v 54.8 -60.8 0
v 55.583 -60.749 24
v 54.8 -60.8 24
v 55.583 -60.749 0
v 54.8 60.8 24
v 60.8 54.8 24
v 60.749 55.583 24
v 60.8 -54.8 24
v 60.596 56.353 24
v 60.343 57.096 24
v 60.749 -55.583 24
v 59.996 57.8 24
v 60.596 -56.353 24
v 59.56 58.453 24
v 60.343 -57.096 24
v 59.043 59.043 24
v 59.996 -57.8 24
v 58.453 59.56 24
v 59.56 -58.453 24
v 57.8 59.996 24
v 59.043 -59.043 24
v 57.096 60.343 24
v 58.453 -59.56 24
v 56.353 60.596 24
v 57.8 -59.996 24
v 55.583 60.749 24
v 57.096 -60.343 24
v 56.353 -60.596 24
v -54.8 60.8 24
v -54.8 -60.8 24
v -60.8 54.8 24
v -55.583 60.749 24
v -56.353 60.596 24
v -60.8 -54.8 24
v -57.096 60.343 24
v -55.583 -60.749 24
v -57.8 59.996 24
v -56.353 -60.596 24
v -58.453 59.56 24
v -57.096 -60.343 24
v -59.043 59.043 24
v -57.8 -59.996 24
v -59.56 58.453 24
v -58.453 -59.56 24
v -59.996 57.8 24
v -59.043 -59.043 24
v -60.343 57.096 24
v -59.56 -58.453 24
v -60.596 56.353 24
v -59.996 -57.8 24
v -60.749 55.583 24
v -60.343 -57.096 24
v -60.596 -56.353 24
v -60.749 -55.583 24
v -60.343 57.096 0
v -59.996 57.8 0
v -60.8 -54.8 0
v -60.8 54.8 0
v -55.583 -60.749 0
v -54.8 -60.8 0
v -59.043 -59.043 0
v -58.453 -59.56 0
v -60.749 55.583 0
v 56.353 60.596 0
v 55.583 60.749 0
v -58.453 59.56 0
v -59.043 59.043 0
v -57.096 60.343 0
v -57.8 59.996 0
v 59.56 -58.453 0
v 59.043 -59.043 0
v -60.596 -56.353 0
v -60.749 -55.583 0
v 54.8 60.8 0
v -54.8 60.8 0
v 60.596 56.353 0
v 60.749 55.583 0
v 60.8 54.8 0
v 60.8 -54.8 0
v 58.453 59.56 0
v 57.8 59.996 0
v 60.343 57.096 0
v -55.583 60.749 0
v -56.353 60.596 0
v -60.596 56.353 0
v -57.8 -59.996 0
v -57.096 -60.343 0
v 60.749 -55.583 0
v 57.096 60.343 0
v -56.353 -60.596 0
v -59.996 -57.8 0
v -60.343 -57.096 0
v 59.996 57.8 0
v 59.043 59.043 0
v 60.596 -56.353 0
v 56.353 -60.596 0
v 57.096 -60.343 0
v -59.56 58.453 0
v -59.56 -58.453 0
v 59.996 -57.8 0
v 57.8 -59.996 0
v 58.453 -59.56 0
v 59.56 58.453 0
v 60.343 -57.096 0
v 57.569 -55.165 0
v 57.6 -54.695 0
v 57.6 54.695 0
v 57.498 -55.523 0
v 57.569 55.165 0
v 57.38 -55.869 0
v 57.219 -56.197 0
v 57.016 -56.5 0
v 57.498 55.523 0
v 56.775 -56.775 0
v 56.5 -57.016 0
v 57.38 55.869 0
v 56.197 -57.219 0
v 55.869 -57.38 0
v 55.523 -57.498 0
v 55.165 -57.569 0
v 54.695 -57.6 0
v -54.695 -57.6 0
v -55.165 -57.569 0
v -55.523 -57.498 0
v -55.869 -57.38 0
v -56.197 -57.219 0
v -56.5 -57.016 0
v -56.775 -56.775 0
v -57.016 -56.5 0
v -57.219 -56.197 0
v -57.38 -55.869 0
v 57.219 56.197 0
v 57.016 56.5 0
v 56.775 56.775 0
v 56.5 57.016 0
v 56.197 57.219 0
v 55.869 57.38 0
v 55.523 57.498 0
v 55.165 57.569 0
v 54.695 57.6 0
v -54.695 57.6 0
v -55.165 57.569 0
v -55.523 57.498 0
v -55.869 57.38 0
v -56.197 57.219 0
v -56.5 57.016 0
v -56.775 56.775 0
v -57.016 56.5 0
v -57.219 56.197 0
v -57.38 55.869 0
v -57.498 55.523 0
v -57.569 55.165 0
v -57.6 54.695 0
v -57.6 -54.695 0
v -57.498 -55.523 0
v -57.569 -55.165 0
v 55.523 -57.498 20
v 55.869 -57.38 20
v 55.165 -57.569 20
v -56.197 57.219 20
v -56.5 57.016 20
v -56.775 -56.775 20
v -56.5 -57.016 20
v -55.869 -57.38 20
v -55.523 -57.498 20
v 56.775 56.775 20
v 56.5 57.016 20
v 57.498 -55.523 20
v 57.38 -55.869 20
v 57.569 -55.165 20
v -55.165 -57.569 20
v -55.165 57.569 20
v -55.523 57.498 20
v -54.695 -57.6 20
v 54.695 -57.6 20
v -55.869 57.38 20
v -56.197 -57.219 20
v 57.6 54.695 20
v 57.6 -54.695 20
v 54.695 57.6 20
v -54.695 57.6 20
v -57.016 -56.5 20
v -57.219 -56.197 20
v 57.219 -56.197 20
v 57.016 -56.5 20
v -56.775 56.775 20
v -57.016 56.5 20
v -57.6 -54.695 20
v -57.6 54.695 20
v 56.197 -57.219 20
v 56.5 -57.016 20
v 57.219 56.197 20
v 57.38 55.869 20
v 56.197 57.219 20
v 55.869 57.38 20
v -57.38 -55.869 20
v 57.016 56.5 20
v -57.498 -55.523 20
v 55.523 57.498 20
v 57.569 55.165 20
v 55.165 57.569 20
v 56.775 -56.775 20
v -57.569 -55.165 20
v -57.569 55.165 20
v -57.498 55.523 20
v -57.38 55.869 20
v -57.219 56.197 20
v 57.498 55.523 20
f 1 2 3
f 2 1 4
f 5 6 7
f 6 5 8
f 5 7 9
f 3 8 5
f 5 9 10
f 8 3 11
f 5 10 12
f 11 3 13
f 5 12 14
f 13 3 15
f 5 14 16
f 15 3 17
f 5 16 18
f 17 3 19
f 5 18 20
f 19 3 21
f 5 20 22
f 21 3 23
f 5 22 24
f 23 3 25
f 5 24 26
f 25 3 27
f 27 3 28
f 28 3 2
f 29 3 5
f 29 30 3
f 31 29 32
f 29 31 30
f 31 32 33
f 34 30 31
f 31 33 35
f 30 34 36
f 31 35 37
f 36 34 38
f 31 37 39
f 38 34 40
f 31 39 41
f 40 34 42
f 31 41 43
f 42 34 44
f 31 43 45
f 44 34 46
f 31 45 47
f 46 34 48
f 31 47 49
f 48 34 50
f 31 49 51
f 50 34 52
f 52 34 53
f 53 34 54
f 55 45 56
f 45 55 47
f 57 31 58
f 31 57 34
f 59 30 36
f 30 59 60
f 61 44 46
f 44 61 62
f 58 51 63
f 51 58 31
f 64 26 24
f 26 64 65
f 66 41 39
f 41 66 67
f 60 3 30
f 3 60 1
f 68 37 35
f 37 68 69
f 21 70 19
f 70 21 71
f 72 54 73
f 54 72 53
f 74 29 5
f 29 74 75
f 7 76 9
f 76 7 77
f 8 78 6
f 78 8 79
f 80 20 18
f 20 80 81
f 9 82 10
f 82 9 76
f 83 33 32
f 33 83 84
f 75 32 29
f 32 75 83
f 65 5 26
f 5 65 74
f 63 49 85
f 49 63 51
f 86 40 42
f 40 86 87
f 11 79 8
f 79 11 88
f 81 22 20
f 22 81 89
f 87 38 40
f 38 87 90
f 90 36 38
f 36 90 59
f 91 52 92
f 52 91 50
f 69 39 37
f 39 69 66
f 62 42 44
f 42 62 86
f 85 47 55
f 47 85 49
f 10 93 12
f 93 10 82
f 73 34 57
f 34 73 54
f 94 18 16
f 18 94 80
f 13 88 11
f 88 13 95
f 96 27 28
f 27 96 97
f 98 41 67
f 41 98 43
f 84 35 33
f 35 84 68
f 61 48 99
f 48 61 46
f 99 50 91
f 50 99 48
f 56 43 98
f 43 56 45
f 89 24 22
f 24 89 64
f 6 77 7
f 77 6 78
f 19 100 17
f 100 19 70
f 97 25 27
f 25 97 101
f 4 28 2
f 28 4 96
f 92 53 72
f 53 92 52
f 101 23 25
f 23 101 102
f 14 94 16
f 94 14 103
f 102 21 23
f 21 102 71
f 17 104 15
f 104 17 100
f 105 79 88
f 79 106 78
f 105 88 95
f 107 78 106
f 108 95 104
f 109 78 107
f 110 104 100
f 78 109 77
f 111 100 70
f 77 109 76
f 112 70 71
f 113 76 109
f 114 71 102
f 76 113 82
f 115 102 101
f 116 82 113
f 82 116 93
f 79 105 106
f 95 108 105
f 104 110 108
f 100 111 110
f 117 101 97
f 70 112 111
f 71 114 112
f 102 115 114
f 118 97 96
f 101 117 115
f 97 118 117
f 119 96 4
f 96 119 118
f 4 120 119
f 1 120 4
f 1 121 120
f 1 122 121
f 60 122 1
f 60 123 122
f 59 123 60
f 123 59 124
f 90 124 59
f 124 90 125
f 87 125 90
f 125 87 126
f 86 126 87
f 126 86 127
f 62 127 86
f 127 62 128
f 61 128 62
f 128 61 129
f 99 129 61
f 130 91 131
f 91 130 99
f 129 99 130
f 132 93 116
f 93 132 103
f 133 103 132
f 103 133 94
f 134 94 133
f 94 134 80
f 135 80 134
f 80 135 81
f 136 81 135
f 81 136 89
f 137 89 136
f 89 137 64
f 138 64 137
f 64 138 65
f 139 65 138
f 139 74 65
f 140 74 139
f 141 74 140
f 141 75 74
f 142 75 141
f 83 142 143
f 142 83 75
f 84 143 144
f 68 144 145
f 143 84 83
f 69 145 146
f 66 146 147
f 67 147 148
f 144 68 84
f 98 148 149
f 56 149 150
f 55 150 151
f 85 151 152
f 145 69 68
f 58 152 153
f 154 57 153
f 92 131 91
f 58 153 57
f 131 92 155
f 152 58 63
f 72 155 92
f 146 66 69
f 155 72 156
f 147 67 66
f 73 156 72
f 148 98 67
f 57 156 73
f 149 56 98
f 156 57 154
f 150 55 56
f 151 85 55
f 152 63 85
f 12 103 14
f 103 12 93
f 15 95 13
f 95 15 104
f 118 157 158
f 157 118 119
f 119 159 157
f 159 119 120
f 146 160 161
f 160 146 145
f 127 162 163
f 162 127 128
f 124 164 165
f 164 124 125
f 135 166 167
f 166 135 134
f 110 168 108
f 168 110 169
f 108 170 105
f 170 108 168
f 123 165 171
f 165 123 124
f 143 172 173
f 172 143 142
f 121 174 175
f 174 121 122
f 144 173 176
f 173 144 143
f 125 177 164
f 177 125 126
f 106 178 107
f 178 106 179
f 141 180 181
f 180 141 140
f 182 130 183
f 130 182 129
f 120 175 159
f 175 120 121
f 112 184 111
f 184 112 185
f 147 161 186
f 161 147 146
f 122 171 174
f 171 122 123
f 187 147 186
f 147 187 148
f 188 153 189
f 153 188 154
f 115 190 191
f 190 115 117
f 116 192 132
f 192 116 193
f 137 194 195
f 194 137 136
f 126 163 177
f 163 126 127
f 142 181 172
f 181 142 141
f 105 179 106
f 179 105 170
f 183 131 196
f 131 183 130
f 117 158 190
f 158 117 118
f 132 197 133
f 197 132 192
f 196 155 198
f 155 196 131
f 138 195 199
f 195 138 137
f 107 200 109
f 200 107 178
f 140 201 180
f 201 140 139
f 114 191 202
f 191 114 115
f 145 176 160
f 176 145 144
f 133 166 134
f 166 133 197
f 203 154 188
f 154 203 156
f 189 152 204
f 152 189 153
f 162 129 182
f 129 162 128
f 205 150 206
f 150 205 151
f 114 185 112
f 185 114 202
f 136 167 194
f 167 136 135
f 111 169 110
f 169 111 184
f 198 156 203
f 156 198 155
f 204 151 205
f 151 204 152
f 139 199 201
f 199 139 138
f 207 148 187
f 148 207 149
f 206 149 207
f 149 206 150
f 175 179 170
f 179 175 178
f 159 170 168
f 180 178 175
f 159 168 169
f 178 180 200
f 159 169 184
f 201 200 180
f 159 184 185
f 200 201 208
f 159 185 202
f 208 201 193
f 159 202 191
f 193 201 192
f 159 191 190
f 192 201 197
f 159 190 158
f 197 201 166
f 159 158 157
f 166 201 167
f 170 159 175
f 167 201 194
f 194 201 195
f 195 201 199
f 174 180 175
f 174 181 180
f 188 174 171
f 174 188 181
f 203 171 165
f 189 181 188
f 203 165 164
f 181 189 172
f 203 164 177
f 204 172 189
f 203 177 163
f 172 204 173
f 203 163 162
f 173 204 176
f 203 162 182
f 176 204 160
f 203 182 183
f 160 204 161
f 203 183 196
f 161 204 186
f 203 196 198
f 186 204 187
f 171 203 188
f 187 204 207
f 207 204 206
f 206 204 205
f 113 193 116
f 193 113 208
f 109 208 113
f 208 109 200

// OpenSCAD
// Parametric printable part scaffold — units: mm
// Copy to project src/, rename modules, fill geometry.

/* [Target object] */
object_x = 100;
object_y = 100;
object_z = 20;       // reference only unless used

/* [Fit / structure] */
fit_clearance = 0.8;
wall = 3.2;
deck_thick = 4.0;
clearance_z = 20;    // open height under deck if elevated

/* [Feet] */
foot_recess_d = 12.4;
foot_recess_h = 1.2;
foot_inset = 12;

/* [Quality] */
$fn = 48;
eps = 0.02;

// Derived
pocket_x = object_x + 2 * fit_clearance;
pocket_y = object_y + 2 * fit_clearance;
outer_x = pocket_x + 2 * 10;
outer_y = pocket_y + 2 * 10;

module outer_footprint() {
  offset(r = 6)
    square([outer_x - 12, outer_y - 12], center = true);
}

module part() {
  difference() {
    union() {
      // TODO: skirt / body
      linear_extrude(height = clearance_z + deck_thick)
        outer_footprint();
    }
    // hollow interior example
    translate([0, 0, -eps])
      linear_extrude(height = clearance_z + eps)
        offset(r = -wall)
          outer_footprint();
    // foot recesses
    for (sx = [-1, 1], sy = [-1, 1])
      translate([sx * (outer_x / 2 - foot_inset),
                 sy * (outer_y / 2 - foot_inset),
                 -eps])
        cylinder(d = foot_recess_d, h = foot_recess_h + eps);
  }
}

echo(str("outer_xy=", outer_x, "x", outer_y));
echo(str("P1S_fit_xy=", (outer_x < 250 && outer_y < 250)));

part();
